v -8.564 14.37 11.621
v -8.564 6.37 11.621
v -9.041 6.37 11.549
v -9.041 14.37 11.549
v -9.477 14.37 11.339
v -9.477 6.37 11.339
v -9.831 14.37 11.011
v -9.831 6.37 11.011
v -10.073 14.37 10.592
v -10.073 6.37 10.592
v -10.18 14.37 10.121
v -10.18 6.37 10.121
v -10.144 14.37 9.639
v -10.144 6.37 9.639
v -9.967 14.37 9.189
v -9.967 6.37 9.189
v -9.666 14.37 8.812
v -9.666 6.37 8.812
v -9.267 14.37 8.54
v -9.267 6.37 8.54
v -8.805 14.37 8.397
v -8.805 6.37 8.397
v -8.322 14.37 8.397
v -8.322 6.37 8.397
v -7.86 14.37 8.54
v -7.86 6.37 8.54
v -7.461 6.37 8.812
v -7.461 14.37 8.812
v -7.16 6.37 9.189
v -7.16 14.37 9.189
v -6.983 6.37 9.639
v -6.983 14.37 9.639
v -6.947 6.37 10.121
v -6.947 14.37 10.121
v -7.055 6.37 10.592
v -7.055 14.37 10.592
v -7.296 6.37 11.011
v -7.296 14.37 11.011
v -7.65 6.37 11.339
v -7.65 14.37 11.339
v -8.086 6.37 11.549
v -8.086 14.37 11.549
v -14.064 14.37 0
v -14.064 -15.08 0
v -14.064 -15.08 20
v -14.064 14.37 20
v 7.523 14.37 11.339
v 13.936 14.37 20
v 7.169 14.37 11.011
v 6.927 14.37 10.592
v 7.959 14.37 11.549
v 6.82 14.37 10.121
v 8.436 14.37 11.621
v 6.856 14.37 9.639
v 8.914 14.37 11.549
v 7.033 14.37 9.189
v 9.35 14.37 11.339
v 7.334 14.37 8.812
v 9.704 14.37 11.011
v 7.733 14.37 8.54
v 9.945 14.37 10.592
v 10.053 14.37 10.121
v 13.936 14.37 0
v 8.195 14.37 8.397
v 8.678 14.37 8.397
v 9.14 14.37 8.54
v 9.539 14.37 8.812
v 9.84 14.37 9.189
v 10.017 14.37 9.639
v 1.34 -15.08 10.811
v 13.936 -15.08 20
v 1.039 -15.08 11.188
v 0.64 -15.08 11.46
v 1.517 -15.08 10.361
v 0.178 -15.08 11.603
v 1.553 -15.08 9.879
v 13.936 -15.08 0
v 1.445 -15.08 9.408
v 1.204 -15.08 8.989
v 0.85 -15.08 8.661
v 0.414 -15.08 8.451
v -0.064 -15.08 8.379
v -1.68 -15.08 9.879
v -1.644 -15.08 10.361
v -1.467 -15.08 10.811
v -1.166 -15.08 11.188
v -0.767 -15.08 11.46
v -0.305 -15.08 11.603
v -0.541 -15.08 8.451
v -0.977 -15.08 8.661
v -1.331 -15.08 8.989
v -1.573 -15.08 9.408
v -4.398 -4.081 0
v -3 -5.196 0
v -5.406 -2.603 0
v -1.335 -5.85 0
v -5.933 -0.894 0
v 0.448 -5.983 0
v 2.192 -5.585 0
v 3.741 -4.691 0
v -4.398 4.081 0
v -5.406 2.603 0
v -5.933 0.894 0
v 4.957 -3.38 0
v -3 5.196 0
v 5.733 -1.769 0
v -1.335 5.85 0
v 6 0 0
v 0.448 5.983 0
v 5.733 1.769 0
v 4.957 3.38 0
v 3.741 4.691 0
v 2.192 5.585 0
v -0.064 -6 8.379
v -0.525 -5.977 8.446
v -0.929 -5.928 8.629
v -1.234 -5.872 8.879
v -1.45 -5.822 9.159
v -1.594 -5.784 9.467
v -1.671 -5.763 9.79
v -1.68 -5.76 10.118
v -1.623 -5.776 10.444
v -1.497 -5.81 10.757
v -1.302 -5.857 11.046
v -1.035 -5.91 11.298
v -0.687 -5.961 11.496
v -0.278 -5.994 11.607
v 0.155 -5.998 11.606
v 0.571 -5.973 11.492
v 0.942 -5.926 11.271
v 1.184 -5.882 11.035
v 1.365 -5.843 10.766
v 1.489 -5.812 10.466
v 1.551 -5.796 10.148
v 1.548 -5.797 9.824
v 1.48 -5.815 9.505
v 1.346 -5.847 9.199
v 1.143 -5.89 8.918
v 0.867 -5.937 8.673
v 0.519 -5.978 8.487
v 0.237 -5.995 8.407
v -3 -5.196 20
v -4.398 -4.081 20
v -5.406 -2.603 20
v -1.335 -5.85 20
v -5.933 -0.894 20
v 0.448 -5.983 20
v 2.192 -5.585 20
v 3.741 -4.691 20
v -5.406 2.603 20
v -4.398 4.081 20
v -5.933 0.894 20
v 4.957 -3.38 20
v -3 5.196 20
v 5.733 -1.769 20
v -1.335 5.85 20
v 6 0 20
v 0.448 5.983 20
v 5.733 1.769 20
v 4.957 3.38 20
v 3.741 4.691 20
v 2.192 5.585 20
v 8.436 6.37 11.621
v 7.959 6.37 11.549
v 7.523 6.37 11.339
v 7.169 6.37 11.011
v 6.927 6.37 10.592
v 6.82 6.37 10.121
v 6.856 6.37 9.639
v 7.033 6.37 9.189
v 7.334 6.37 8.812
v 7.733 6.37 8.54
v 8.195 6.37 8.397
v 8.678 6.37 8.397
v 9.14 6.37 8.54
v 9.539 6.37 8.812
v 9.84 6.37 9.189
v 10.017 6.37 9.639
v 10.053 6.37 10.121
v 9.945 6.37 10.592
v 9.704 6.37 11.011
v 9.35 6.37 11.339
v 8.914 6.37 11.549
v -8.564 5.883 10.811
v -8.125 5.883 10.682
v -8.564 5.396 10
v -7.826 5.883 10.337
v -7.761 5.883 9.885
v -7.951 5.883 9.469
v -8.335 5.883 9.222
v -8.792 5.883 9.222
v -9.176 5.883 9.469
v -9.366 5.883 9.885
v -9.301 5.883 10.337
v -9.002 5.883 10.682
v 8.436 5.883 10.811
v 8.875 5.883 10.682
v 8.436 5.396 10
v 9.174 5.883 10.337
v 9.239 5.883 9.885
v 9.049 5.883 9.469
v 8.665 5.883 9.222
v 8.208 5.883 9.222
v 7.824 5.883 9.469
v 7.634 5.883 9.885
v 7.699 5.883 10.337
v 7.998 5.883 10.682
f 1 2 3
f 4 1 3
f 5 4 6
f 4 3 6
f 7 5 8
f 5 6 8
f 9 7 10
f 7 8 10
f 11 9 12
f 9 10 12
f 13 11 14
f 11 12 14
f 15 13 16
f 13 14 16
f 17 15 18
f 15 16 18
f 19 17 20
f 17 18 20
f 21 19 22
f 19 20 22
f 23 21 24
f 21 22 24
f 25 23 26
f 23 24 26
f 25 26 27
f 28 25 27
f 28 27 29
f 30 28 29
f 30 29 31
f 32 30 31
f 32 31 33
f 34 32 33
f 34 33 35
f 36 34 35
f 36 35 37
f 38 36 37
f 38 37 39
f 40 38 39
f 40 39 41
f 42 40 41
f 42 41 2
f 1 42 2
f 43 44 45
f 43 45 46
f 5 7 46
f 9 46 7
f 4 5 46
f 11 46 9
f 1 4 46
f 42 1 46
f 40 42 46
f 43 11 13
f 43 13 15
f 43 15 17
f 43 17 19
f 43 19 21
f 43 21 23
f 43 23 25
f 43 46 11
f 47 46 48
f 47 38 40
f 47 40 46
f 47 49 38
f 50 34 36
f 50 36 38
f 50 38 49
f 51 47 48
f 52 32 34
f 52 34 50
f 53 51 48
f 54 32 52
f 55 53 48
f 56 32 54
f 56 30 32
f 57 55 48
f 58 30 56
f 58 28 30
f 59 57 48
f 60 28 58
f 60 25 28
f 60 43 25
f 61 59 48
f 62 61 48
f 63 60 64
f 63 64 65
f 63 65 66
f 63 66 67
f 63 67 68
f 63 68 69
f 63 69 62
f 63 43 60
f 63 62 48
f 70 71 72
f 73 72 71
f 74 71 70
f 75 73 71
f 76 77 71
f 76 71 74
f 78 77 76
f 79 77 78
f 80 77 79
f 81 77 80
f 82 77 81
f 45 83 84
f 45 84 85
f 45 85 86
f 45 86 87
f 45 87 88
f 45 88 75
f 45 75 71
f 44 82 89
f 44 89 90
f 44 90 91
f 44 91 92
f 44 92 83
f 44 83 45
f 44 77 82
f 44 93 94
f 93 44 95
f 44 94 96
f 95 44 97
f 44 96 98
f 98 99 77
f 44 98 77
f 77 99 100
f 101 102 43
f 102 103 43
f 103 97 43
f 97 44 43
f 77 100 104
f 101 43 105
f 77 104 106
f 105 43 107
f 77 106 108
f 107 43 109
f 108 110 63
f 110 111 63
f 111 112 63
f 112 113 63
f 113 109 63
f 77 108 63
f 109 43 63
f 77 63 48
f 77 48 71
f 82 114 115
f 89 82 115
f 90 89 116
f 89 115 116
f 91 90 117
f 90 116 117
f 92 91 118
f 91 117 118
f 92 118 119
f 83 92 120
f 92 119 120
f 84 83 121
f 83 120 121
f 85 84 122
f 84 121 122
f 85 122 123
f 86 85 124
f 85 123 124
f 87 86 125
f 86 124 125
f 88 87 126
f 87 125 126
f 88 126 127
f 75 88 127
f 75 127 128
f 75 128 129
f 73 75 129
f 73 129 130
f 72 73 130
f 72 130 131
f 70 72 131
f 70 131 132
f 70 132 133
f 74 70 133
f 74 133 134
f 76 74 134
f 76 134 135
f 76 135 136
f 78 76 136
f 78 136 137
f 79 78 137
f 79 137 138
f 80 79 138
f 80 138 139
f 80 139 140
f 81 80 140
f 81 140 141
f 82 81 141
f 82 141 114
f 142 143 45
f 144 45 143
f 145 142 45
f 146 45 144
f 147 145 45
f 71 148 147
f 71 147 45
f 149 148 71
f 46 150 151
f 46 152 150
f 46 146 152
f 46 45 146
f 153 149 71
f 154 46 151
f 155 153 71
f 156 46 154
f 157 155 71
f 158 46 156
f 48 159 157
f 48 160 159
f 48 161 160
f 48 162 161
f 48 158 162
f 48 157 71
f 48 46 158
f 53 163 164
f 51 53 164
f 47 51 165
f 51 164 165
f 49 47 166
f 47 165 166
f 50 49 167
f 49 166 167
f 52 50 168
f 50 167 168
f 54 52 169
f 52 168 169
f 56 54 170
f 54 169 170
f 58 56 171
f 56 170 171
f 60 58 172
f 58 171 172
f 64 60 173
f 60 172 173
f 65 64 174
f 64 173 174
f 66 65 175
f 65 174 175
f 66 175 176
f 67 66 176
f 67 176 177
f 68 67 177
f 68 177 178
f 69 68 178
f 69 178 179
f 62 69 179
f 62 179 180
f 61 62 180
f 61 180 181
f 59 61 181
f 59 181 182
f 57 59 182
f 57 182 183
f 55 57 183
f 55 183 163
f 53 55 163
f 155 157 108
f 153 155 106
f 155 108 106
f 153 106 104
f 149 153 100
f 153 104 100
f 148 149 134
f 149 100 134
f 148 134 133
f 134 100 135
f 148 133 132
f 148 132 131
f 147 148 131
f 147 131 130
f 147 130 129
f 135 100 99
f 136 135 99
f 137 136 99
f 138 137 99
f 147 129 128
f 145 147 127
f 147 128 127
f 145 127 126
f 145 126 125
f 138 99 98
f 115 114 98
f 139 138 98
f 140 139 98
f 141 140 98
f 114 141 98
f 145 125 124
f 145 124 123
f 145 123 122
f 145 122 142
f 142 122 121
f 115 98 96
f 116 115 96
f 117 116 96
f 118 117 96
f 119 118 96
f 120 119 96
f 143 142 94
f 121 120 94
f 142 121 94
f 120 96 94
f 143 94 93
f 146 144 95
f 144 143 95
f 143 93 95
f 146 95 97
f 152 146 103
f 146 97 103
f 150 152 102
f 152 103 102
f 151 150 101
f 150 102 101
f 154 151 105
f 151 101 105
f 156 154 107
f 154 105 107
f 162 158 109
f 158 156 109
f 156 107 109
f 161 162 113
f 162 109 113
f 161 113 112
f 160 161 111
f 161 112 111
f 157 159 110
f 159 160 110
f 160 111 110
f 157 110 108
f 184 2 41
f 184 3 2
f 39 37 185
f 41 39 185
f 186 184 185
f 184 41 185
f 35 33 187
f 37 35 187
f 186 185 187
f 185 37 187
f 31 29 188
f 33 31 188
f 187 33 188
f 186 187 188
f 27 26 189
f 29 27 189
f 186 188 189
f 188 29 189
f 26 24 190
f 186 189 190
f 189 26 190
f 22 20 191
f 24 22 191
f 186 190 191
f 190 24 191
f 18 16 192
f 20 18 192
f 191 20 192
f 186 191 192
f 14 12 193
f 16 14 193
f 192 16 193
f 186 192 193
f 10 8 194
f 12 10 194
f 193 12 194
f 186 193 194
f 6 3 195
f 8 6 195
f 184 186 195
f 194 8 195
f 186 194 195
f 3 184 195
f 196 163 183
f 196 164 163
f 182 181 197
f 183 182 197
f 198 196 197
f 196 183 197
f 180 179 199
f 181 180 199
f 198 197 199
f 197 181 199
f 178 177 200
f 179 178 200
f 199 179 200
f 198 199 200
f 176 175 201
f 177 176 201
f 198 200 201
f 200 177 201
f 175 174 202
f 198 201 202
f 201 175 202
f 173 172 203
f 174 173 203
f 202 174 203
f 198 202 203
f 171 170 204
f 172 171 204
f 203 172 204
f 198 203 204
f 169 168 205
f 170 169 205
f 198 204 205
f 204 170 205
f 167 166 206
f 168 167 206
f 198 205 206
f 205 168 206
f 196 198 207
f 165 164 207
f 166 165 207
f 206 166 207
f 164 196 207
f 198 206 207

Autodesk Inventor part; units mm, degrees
ref_plane "YZ Plane" through (0, 0, 0) normal (1, 0, 0) x (0, 1, 0)
ref_plane "XZ Plane" through (0, 0, 0) normal (0, 1, 0) x (-1, 0, 0)
ref_plane "XY Plane" through (0, 0, 0) normal (0, 0, 1) x (1, 0, 0)
sketch "Esboço1" plane through (0, 0, 0) normal (0, 0, 1) x (1, 0, 0)
  circle A0 centre (0, 0) radius 5.995 construction
  line L0 (13.9364, -15.0797) -> (-14.0636, -15.0797) construction
  line L1 (-14.0636, 14.3703) -> (13.9364, 14.3703)
  line L2 (13.9364, 14.3703) -> (13.9364, -15.0797)
  line L3 (13.9364, -15.0797) -> (-14.0636, -15.0797)
  line L4 (-14.0636, -15.0797) -> (-14.0636, 14.3703)
  circle A1 centre (0, 0) radius 6
  dimension "d0" = 12
extrude "Extrusão1" add sketch "Esboço1" along normal blind 20
sketch "Esboço2" plane through (-14.0636, 14.3703, 0) normal (0, 1, 0) x (1, 0, 0)
  line L0 (28, 0) -> (28, -20) construction
  line L1 (0, 0) -> (0, -20) construction
  line L2 (28, -10) -> (0, -10) construction
  line L3 (14, -10) -> (14, 0) construction
  line L4 (14, -10) -> (5.5, -10) construction
  line L5 (14, -10) -> (22.5, -10) construction
  dimension "d7" = 10
  dimension "d8" = 8.5
  dimension "d9" = 8.5
hole "Furo1" at (8.4364, 14.3703, 10) at (-8.5636, 14.3703, 10) direction (0, -1, 0) diameter 3.242 depth 8 tip angle 118 thread size "M4x0.7" class "6H" standard "ANSI Metric M Profile"
sketch "Esboço3" plane through (-14.0636, -15.0797, 0) normal (0, -1, 0) x (1, 0, 0)
  line L0 (28, 20) -> (0, 20) projected
  line L1 (14, 20) -> (14, 0) construction
  circle A0 centre (14, 10) radius 2
  point P0 (14.0636, 0)
  dimension "d17" = 20
  dimension "d18" = 4
hole "Furo2" at (-0.0636, -15.0797, 10) direction (0, 1, 0) diameter 3.242 depth 10 tip angle 118 thread size "M4x0.7" class "6H" standard "ANSI Metric M Profile"
properties part number "esbarro_carro" material "Alumínio 6061"
